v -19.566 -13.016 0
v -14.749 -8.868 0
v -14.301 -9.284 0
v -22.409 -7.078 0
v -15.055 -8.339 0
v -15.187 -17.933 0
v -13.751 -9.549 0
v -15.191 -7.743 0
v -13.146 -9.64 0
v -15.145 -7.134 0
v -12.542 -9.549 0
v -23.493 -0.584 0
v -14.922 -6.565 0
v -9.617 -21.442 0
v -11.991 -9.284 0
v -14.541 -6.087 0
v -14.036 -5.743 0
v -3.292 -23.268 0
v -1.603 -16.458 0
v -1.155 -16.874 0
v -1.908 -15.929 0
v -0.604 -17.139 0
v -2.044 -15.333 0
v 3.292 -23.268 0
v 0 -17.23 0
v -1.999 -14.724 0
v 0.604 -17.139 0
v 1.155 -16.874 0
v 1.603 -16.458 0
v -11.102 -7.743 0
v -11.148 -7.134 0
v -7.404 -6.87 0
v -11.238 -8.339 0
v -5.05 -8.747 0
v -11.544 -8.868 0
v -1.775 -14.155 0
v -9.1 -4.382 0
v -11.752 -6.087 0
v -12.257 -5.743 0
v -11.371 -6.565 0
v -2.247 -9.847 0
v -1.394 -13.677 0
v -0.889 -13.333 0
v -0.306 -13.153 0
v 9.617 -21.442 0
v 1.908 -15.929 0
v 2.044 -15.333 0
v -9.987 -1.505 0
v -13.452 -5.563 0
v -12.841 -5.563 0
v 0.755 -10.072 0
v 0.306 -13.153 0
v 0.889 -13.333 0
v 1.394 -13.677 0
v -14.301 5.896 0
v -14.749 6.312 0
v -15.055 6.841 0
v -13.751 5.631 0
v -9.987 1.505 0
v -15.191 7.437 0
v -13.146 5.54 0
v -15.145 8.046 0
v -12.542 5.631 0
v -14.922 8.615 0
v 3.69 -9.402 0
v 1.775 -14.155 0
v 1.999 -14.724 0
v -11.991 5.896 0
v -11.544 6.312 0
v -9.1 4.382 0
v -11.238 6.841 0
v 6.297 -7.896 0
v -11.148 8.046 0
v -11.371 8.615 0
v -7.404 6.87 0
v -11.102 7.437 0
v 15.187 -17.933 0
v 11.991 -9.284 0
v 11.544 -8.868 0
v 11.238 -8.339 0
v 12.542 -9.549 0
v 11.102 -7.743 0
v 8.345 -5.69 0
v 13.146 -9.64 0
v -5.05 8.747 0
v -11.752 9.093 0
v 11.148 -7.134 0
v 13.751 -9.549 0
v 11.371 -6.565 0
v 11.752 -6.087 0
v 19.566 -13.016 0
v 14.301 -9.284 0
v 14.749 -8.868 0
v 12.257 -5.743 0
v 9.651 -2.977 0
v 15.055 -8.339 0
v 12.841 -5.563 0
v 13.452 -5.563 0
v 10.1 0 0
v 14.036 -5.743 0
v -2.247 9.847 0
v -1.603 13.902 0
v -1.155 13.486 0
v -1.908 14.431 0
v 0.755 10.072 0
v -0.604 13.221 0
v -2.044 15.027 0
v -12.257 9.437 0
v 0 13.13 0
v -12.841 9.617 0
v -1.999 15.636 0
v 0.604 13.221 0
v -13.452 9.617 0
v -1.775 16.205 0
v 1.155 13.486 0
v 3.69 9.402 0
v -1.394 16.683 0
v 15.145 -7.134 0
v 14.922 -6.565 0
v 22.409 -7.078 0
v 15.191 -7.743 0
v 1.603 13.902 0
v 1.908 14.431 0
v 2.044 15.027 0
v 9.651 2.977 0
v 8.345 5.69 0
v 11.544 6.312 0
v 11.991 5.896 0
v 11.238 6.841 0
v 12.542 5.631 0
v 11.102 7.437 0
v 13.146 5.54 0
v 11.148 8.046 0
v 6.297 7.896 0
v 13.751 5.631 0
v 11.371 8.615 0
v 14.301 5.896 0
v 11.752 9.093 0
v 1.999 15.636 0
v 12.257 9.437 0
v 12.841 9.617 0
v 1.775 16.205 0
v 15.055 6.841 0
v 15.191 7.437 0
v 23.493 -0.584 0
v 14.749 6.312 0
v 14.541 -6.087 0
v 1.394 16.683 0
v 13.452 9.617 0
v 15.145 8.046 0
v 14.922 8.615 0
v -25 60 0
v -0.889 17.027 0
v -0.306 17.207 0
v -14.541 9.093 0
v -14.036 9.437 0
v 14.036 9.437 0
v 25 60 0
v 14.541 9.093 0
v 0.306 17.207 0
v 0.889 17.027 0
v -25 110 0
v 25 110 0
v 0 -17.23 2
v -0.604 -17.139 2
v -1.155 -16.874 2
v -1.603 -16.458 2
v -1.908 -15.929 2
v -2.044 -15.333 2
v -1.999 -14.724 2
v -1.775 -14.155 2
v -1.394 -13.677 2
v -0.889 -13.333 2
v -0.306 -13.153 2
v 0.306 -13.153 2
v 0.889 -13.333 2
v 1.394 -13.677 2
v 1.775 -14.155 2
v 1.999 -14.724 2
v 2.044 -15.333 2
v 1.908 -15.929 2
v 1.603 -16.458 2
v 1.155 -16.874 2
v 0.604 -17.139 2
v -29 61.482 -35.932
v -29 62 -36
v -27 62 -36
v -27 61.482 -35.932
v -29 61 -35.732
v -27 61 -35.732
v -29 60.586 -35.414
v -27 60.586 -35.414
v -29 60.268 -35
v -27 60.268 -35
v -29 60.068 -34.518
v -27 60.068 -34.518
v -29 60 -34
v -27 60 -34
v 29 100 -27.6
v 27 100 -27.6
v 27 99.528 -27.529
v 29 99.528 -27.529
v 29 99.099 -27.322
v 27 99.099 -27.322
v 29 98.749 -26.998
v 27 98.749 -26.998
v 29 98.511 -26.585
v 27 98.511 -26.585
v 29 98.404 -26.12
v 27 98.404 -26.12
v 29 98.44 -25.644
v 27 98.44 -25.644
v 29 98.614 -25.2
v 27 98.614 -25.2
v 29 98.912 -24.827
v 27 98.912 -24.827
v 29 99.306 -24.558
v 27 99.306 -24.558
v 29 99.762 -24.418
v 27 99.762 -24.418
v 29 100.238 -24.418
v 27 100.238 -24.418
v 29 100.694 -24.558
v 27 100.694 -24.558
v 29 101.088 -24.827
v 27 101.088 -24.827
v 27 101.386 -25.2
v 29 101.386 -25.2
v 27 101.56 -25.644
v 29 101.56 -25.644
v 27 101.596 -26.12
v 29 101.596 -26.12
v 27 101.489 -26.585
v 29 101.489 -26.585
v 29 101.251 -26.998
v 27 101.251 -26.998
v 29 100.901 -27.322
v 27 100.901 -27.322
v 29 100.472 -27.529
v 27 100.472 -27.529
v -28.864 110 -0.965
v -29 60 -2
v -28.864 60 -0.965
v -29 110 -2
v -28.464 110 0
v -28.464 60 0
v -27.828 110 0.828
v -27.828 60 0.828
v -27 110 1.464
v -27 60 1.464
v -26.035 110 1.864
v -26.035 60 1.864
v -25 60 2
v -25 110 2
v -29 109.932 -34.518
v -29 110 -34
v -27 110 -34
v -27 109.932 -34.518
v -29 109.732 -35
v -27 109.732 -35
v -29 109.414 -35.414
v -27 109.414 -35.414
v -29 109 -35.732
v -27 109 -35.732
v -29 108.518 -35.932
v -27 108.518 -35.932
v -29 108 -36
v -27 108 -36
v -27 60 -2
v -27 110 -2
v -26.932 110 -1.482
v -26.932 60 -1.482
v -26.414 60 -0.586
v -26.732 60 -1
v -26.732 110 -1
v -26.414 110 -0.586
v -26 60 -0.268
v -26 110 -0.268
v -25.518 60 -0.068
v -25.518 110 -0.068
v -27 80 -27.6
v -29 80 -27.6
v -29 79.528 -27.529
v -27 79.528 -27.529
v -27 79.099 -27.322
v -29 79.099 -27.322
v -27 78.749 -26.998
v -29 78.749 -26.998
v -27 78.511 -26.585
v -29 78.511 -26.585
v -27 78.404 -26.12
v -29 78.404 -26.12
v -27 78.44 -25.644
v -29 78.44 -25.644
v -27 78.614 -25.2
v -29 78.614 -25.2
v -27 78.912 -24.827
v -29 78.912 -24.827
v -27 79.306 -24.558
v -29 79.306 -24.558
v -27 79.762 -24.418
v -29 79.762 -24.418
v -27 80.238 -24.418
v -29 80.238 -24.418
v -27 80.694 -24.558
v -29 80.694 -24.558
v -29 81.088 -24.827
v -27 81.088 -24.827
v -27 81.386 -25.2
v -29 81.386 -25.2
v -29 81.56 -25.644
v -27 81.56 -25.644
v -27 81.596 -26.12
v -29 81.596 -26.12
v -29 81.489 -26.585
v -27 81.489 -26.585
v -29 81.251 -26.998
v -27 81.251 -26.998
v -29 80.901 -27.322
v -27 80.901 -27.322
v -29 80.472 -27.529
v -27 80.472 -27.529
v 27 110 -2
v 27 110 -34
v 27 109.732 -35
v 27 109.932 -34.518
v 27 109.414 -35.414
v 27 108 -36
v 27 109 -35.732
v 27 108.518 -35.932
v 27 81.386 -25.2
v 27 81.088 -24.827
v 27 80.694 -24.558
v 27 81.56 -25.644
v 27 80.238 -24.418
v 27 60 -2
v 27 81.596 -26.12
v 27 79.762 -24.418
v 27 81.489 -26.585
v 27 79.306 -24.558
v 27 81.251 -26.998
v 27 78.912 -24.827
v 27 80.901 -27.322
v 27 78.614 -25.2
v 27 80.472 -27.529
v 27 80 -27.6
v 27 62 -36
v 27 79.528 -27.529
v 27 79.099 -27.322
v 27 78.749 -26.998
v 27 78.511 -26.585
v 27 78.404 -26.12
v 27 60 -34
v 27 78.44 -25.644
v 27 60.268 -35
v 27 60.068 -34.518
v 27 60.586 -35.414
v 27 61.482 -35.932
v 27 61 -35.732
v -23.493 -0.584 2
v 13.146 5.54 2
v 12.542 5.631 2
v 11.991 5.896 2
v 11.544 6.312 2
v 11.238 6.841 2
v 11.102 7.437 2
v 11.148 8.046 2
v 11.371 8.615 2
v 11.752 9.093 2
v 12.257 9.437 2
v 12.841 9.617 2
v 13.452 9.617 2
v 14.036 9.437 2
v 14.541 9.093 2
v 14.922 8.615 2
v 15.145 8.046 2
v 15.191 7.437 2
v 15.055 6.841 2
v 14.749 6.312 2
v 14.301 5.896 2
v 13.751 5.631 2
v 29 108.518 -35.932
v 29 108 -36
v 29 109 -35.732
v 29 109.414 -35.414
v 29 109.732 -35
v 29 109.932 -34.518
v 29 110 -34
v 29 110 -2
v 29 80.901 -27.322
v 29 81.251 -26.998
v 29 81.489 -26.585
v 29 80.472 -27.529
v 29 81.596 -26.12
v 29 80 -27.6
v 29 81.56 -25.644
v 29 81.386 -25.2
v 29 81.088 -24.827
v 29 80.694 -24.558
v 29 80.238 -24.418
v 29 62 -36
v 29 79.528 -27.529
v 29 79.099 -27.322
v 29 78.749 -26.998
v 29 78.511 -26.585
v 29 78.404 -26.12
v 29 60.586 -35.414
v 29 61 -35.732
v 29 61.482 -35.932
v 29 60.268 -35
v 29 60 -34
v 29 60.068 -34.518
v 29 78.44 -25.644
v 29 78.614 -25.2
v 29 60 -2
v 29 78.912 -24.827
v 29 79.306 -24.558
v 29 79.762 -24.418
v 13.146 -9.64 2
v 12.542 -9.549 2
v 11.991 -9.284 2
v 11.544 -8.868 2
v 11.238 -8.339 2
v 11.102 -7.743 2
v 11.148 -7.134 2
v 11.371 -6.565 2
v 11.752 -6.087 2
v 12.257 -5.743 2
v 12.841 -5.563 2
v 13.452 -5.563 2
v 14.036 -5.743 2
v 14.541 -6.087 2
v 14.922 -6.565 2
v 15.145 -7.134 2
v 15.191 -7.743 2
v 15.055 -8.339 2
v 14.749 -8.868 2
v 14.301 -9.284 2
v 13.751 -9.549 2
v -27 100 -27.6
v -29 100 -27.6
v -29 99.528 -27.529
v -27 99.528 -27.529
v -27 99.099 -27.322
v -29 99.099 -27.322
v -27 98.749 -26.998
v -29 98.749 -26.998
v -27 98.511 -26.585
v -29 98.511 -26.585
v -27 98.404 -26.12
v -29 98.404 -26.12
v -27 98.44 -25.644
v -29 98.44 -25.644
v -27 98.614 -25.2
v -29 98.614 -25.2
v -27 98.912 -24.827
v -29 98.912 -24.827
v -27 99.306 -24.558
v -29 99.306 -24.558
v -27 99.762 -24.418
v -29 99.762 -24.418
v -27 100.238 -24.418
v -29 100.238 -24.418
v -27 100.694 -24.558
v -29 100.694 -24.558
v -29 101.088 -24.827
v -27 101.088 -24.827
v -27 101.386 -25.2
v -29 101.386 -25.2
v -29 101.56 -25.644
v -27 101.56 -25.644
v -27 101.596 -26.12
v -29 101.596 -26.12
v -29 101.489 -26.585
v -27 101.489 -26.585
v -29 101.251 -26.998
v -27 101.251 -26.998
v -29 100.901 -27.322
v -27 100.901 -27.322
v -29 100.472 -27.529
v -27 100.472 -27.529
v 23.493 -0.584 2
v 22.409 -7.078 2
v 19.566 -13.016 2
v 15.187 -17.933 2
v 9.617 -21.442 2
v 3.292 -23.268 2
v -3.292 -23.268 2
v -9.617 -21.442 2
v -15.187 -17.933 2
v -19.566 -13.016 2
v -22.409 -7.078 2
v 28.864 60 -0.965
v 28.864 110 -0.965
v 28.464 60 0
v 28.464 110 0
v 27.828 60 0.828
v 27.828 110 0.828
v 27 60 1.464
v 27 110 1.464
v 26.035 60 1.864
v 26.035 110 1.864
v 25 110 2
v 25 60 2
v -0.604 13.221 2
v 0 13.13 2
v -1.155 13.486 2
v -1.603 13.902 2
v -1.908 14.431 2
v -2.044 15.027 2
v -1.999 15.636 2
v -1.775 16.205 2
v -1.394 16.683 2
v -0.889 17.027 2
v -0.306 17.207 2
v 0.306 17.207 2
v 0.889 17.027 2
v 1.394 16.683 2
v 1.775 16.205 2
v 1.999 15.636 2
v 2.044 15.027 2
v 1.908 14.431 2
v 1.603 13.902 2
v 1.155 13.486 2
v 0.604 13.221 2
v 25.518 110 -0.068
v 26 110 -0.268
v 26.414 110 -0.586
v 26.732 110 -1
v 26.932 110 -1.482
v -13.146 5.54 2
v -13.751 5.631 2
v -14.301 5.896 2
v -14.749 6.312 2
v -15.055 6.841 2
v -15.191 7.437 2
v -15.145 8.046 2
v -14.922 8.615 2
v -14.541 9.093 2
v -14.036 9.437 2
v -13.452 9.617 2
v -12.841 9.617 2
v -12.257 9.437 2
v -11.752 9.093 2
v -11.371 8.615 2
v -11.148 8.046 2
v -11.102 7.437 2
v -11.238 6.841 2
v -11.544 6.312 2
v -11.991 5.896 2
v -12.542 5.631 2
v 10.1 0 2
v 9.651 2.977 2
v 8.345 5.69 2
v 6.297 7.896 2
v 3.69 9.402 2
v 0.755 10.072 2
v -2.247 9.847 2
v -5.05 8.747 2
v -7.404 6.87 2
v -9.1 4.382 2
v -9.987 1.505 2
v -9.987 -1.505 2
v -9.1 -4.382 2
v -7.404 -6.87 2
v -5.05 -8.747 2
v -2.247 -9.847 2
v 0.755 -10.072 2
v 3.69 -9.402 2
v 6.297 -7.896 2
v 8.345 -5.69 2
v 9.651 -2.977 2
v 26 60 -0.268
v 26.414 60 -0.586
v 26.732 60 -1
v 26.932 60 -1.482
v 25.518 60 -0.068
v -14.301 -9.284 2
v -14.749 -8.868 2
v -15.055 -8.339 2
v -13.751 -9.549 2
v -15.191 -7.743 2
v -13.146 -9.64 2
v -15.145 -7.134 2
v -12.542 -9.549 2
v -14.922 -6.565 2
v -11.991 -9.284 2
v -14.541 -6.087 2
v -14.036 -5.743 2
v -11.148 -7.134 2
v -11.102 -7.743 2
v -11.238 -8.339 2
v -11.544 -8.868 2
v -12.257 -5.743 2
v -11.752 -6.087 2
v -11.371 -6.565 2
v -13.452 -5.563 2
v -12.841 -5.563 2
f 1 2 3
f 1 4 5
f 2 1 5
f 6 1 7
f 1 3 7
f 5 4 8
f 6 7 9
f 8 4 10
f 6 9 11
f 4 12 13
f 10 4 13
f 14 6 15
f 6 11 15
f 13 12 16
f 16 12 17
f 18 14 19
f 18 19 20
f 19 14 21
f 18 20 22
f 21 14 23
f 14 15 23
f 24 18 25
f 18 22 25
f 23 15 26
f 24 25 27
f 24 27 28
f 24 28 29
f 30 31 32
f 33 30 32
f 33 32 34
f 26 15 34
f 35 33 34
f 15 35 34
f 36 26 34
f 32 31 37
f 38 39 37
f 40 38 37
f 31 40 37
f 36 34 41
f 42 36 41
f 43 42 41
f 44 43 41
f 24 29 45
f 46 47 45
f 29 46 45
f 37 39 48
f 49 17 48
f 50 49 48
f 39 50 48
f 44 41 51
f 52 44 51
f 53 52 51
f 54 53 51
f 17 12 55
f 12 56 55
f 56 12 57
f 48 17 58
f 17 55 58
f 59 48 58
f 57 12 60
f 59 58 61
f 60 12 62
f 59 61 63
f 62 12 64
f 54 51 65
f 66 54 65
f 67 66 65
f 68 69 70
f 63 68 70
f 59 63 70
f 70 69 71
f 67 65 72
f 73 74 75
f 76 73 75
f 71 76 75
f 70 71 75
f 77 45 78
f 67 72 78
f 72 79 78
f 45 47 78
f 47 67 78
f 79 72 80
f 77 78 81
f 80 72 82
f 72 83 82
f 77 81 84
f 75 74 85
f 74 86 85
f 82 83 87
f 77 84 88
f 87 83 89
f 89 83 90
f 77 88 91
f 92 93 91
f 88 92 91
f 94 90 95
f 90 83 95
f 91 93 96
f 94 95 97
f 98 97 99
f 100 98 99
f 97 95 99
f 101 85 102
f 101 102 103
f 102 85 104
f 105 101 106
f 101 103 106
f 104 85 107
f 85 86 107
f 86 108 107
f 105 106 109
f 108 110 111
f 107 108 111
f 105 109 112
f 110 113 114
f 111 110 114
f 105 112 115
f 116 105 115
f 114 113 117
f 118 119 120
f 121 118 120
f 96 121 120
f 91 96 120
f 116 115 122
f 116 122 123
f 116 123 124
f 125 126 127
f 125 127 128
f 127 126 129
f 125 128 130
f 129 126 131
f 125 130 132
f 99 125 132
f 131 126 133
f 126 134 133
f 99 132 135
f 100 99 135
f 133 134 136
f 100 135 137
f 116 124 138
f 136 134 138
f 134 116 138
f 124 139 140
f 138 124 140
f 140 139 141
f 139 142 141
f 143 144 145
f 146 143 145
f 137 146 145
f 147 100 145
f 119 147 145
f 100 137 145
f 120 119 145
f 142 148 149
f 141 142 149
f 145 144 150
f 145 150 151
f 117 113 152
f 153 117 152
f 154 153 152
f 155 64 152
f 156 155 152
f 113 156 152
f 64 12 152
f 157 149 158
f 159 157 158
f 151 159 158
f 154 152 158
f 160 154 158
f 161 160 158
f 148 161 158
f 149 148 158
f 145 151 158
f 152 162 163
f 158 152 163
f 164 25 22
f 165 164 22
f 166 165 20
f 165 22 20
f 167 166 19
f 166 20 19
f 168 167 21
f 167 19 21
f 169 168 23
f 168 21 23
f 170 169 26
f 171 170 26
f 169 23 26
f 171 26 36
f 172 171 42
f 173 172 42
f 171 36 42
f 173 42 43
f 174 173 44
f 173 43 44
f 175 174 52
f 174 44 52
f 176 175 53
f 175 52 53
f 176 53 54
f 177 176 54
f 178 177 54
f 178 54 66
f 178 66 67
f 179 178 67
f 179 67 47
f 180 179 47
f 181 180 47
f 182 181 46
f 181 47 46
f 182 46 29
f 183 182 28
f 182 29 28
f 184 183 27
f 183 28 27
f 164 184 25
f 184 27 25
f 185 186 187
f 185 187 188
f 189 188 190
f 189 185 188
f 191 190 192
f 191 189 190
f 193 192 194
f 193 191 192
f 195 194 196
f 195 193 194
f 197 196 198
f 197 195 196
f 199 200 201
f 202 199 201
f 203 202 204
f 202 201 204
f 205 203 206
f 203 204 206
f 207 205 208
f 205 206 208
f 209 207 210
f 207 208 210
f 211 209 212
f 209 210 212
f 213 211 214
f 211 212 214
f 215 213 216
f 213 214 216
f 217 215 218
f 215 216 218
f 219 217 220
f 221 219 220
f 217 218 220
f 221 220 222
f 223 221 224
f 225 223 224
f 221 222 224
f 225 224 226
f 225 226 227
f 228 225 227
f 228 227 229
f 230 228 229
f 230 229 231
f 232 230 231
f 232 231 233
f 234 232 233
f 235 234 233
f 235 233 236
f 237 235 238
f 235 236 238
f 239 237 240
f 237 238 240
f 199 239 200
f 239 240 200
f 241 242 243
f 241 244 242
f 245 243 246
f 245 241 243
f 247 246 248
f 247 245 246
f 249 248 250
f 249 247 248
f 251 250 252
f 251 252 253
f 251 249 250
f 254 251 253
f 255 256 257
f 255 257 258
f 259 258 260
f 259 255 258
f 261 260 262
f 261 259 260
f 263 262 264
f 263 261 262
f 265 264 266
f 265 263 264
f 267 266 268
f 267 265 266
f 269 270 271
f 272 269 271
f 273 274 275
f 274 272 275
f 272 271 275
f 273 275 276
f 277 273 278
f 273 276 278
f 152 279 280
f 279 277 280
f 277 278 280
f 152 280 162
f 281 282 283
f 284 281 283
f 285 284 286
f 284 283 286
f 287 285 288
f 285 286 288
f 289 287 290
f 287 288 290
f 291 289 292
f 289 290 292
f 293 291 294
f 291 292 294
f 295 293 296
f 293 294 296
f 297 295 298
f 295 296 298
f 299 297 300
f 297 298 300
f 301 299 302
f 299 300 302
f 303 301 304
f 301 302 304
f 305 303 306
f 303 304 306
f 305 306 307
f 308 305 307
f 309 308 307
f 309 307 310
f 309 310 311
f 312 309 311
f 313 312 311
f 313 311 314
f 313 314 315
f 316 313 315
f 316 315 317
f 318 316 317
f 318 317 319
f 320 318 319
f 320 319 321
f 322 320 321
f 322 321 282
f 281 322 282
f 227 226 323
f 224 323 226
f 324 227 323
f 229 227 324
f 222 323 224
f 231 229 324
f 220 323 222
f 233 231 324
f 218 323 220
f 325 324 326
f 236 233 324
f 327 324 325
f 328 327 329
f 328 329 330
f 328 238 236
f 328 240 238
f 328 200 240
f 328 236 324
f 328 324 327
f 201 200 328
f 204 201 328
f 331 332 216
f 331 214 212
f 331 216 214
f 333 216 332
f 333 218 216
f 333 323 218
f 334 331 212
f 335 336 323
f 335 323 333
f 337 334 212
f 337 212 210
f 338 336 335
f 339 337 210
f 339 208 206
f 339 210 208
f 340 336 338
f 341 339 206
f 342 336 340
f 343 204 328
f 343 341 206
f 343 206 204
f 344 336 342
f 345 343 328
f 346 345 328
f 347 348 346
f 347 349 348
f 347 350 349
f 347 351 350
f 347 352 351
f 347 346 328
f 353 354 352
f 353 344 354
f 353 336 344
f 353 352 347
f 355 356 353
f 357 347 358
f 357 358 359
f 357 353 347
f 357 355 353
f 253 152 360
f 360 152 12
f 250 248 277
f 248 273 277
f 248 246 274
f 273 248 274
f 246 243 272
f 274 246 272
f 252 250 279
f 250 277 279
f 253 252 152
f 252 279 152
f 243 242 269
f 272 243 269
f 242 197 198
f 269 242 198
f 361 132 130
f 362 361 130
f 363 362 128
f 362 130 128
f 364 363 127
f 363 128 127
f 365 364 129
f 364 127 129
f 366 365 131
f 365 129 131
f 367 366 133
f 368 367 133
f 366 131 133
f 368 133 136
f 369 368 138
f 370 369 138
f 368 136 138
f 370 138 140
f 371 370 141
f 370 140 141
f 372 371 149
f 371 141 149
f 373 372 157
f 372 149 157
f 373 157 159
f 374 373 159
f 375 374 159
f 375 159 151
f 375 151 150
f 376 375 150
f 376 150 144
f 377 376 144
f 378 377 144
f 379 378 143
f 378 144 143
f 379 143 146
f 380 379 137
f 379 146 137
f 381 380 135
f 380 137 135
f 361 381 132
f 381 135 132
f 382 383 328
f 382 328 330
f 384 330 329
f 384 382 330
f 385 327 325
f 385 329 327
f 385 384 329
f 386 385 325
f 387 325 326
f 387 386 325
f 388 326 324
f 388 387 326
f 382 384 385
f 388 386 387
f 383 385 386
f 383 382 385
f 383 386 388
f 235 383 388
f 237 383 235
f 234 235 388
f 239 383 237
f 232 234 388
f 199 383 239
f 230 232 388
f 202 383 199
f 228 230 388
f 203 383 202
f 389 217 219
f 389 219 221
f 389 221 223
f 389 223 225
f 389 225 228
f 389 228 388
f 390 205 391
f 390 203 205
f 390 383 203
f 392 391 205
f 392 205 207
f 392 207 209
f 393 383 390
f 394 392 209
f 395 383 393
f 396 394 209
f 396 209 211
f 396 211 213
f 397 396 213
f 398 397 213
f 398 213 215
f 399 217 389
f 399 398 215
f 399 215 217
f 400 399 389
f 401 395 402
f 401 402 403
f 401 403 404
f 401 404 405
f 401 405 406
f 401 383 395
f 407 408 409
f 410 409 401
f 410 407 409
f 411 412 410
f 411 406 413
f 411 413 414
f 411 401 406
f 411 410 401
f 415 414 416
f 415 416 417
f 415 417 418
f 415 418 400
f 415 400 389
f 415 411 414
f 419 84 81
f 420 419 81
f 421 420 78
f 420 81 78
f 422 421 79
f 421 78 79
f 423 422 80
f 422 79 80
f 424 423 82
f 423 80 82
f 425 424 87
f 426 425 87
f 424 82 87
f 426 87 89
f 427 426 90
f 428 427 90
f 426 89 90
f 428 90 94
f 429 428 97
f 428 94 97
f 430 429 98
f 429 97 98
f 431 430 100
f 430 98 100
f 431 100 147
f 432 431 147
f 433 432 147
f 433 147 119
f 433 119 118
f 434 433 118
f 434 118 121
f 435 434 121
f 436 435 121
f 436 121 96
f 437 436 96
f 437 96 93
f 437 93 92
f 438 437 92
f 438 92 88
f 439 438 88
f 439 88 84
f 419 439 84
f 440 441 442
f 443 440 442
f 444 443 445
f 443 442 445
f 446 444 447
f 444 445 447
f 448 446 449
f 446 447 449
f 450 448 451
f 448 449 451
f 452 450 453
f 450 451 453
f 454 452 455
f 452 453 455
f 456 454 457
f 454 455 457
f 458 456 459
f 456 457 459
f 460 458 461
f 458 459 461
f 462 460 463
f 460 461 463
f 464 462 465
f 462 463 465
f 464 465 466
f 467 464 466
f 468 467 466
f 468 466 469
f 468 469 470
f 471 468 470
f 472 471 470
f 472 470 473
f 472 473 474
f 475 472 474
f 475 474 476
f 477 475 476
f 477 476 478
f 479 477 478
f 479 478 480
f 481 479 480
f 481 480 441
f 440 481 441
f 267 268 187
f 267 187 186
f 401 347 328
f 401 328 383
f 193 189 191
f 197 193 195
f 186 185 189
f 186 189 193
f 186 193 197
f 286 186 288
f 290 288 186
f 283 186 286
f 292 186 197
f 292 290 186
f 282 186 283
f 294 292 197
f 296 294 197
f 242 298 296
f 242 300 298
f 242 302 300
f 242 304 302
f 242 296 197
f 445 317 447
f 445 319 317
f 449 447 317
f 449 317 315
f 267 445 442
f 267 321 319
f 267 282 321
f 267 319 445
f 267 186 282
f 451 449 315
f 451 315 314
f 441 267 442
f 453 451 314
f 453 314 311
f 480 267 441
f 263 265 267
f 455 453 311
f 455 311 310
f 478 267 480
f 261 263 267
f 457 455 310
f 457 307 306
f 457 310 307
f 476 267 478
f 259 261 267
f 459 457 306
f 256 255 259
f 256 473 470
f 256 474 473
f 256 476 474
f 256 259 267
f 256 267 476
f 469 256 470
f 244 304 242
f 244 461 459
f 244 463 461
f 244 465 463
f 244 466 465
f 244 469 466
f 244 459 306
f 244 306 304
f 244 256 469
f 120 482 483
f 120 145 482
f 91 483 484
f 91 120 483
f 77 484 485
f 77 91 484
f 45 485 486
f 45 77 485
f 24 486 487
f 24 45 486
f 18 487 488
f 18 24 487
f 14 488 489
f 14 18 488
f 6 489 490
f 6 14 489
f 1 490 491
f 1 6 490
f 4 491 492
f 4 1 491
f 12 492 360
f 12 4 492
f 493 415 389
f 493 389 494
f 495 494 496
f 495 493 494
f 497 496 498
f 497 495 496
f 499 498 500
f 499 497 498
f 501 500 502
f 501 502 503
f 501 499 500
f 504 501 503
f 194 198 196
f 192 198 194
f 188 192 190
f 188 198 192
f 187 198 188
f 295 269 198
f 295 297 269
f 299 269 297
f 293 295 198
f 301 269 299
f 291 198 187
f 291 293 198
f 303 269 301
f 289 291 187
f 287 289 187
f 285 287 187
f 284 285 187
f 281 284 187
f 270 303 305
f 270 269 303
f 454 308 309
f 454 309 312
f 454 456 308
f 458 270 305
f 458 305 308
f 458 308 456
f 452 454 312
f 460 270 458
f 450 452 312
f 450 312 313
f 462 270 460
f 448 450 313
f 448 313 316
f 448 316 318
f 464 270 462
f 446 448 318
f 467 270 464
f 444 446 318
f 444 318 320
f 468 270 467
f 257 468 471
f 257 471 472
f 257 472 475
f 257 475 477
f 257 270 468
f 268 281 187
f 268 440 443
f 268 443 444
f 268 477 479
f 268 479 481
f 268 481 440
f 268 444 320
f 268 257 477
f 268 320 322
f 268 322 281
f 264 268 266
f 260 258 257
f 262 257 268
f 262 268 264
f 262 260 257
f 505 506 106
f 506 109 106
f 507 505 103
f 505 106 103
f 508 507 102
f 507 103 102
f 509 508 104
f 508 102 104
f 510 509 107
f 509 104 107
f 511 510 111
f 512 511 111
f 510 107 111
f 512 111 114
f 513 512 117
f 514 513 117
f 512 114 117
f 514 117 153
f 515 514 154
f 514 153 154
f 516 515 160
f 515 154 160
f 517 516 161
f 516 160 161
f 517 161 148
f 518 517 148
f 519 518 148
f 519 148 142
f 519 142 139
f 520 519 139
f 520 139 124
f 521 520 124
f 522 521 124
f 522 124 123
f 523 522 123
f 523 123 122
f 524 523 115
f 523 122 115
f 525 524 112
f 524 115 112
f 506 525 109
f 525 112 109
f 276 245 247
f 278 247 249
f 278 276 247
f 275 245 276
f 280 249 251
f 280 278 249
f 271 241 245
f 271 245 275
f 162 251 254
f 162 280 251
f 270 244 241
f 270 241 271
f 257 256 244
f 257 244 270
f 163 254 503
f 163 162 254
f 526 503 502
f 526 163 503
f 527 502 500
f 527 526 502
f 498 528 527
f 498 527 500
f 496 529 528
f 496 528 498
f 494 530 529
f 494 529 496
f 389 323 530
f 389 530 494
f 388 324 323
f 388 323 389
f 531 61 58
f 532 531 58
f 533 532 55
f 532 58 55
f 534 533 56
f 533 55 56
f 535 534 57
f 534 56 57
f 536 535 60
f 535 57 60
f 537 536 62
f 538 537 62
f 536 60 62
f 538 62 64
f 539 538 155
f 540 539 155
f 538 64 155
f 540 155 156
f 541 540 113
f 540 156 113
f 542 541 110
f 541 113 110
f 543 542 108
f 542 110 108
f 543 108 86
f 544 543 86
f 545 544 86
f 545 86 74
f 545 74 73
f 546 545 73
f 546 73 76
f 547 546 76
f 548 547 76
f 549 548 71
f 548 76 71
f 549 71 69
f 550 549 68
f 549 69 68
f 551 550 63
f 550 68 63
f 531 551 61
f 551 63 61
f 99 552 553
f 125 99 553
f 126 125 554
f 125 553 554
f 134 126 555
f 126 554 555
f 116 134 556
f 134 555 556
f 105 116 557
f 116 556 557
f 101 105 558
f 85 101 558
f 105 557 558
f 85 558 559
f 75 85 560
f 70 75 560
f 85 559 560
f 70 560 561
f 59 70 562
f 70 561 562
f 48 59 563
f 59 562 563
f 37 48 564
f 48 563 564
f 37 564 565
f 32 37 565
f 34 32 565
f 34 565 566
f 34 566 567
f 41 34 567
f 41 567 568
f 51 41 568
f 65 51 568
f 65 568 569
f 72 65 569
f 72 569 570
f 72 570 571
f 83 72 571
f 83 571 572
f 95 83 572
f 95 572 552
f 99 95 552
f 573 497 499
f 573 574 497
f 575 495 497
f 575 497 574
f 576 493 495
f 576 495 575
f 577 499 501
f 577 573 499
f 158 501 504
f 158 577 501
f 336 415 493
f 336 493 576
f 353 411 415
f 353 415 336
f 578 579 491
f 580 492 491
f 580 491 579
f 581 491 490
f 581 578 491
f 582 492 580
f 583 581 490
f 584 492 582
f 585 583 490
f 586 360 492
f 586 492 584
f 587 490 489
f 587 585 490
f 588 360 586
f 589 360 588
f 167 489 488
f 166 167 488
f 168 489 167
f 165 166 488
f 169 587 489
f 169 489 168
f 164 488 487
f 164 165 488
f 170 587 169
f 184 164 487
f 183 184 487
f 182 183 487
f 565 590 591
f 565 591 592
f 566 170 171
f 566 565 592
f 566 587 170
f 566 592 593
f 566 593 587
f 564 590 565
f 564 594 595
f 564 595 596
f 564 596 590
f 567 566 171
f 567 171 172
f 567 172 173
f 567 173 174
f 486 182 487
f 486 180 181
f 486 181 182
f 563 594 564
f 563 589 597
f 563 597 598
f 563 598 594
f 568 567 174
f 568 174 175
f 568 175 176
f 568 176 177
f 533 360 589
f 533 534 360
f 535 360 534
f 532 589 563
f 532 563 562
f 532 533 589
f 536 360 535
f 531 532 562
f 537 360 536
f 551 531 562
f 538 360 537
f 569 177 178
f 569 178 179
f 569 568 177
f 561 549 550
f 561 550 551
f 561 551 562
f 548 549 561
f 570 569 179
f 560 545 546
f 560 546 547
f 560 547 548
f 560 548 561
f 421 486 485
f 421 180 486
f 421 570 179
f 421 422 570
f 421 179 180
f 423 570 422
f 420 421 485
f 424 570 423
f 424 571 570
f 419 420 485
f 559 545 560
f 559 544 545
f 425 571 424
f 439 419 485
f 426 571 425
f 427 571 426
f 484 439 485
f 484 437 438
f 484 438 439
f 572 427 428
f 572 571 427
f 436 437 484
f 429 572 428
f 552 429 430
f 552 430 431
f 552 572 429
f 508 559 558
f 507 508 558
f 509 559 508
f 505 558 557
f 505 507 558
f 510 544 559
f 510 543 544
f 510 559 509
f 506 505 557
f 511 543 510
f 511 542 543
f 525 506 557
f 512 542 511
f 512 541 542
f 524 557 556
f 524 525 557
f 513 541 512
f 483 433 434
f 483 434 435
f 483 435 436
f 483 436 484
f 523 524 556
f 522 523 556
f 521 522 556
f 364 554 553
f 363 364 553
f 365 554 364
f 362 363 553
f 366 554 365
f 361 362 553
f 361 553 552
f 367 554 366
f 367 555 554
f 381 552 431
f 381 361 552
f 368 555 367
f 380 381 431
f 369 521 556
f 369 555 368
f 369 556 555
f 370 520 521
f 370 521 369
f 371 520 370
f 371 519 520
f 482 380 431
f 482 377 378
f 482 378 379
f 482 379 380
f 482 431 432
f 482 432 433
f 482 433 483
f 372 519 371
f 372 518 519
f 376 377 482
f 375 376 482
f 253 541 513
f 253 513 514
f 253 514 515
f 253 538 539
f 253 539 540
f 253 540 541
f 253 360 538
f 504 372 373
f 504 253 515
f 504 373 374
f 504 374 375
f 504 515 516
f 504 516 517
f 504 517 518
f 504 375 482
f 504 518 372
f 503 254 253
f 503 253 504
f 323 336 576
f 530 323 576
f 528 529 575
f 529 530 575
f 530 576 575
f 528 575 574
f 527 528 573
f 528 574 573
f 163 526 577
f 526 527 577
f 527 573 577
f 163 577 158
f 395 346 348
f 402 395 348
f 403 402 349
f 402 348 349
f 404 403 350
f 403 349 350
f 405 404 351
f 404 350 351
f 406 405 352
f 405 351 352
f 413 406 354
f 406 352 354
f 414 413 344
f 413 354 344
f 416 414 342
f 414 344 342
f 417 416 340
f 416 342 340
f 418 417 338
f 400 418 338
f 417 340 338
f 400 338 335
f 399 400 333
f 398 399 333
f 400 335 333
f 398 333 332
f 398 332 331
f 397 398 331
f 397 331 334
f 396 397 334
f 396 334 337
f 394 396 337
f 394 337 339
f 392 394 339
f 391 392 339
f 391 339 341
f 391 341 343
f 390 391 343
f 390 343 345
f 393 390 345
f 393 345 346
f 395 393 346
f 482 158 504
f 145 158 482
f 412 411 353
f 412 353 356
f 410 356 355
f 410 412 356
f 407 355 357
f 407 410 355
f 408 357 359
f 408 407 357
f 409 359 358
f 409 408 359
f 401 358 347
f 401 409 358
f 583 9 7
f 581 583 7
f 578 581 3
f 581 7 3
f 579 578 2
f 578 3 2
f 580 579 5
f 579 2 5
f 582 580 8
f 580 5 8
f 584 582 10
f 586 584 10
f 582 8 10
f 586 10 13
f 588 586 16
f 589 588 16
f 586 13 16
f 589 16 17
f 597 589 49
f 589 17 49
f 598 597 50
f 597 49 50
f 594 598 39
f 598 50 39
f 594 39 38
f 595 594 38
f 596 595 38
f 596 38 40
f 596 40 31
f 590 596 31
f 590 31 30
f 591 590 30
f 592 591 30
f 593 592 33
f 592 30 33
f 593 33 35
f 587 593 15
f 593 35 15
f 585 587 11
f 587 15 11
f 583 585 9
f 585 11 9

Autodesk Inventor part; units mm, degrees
ref_plane "YZ Plane" through (0, 0, 0) normal (1, 0, 0) x (0, 1, 0)
ref_plane "XZ Plane" through (0, 0, 0) normal (0, 1, 0) x (-1, 0, 0)
ref_plane "XY Plane" through (0, 0, 0) normal (0, 0, 1) x (1, 0, 0)
sketch "スケッチ1" plane through (0, 0, 0) normal (0, 0, 1) x (1, 0, 0)
  circle A0 centre (0, 0) radius 23.5
  line L0 (0, 0) -> (0, 60)
  line L1 (0, 60) -> (25, 60)
  line L2 (25, 60) -> (25, 110)
  line L3 (25, 110) -> (0, 110)
  line L4 (0, 110) -> (0, 60)
  line L5 (25, 60) -> (23.4927, -0.5845)
  line L6 (0, 60) -> (-25, 60)
  line L7 (-25, 60) -> (-25, 110)
  line L8 (-25, 110) -> (0, 110)
  line L9 (-25, 60) -> (-23.4927, -0.5845)
  point P0 (-23.4927, -0.5845)
  dimension "d0" = 47
  dimension "d1" = 60
  dimension "d2" = 50
  dimension "d3" = 25
extrude "プレート1" add sketch "スケッチ1" along normal blind 2
sketch "スケッチ2" plane through (27, 60, -2) normal (1, 0, 0) x (0, 1, 0)
  line L0 (50, 0) -> (0, 0)
  line L1 (0, 0) -> (0, -34)
  line L2 (0, -34) -> (50, -34)
  line L3 (50, -34) -> (50, 0)
edge flange "フランジ1" height 38 angle 90 thickness 2 bend radius 2 thickness toward (1, 0, 0) relief tear relief width 2 relief depth 1 edges at (25, 85, 0) wall of the first edge with corners at (27, 110, -2) (27, 60, -2) (27, 60, -36) (27, 110, -36)
bend "曲げ1"
corner "コーナー1"
sketch "スケッチ3" plane through (-27, 110, -2) normal (-1, 0, 0) x (0, -1, 0)
  line L0 (50, 0) -> (0, 0)
  line L1 (0, 0) -> (0, -34)
  line L2 (0, -34) -> (50, -34)
  line L3 (50, -34) -> (50, 0)
edge flange "フランジ2" height 38 angle 90 thickness 2 bend radius 2 thickness toward (-1, 0, 0) relief tear relief width 2 relief depth 1 edges at (-25, 85, 0) wall of the first edge with corners at (-27, 60, -2) (-27, 110, -2) (-27, 110, -36) (-27, 60, -36)
bend "曲げ2"
corner "コーナー2"
sketch "スケッチ4" plane through (0, 0, 2) normal (0, 0, 1) x (1, 0, 0)
  circle A0 centre (0, 0) radius 10.1
  dimension "d25" = 20.2
extrude "押し出し1" cut sketch "スケッチ4" against normal blind 10
sketch "スケッチ5" plane through (0, 0, 2) normal (0, 0, 1) x (1, 0, 0)
  circle A0 centre (0, 0) radius 15.18
  point P0 (0, 15.18)
  point P1 (-13.1463, 7.59)
  point P2 (-13.1463, -7.59)
  point P3 (0, -15.18)
  point P4 (13.1463, -7.59)
  point P5 (13.1463, 7.59)
  dimension "d28" = 30.36
  dimension "d31" = 360
hole "穴1" at (0, 15.18, 2) at (-13.1463, 7.59, 2) at (-13.1463, -7.59, 2) at (0, -15.18, 2) at (13.1463, -7.59, 2) at (13.1463, 7.59, 2) direction (0, 0, -1) diameter 4.1 end through all
sketch "スケッチ6" plane through (29, 60, -36) normal (1, 0, 0) x (0, 0, -1)
  line L0 (0, 0) -> (0, 50) projected
  line L1 (0, 10) -> (-34, 10)
  line L2 (-34, 50) -> (-34, 0) projected
  line L3 (0, 0) -> (-34, 0) projected
  line L4 (0, 50) -> (-34, 50) projected
  line L5 (-10, 50) -> (-10, 10)
  point P0 (-36, -60)
  point P1 (-10, 20)
  point P2 (-10, 40)
  point P3 (-36, 50)
  dimension "d40" = 10
  dimension "d42" = 10
  dimension "d43" = 20
  dimension "d62" = 26
hole "穴2" at (29, 80, -26) at (29, 100, -26) direction (-1, 0, 0) diameter 3.2 end through all
sketch "スケッチ7" plane through (0, 0, 2) normal (0, 0, 1) x (1, 0, 0)
  line L0 (-15, 100) -> (15, 100)
  line L1 (15, 100) -> (15, 60)
  line L2 (15, 60) -> (-15, 60)
  line L3 (-15, 60) -> (-15, 100)
  line L4 (-25, 110) -> (25, 110) projected
  line L5 (-25, 60) -> (-25, 110) projected
  line L6 (25, 110) -> (25, 60) projected
  circle A0 centre (0, 0) radius 10.1 projected
  circle A1 centre (0, 0) radius 13.5
  line L7 (-13.4958, -0.3358) -> (-14.7481, 50)
  line L8 (-23.4927, -0.5845) -> (-25, 60) projected
  line L9 (13.4958, -0.3358) -> (14.7481, 50)
  line L10 (25, 60) -> (23.4927, -0.5845) projected
  line L11 (-14.7481, 50) -> (14.7481, 50)
  line L12 (-14.0018, 20) -> (14.0018, 20)
  dimension "d51" = 10
  dimension "d52" = 10
  dimension "d53" = 10
  dimension "d54" = 40
  dimension "d55" = 10
  dimension "d56" = 10
  dimension "d57" = 20
extrude "押し出し2" [suppressed]
fillet "フィレット1" [suppressed]
fillet "フィレット2" radius 2 4 edges at (-28, 60, -36) (-28, 110, -36) (28, 60, -36) (28, 110, -36)
equation "\"d38\" = Thickness"
equation "\"d4\" = Thickness"
equation "\"d5\" = BendReliefWidth"
equation "\"d6\" = BendReliefDepth"
equation "\"d7\" = MinimumRemnant"
equation "\"d8\" = TransitionRadius"
equation "\"d11\" = BendRadius"
equation "\"d12\" = CornerReliefSize"
equation "\"d13\" = GapSize"
equation "\"d14\" = JacobiRadiusSize"
equation "\"d15\" = BendReliefWidth"
equation "\"d16\" = BendReliefDepth"
equation "\"d17\" = MinimumRemnant"
equation "\"d18\" = TransitionRadius"
equation "\"d21\" = BendRadius"
equation "\"d22\" = CornerReliefSize"
equation "\"d23\" = GapSize"
equation "\"d24\" = JacobiRadiusSize"
equation "\"BendRadius\" = Thickness"
equation "\"BendReliefWidth\" = Thickness"
equation "\"BendReliefDepth\" = 0.5 * Thickness"
equation "\"CornerReliefSize\" = 4 * Thickness"
equation "\"MinimumRemnant\" = 2 * Thickness"
equation "\"TransitionRadius\" = BendRadius"
equation "\"JacobiRadiusSize\" = BendRadius"
equation "\"GapSize\" = Thickness"
equation "\"Thickness\" = 2"
properties part number "servoplate1_forR3" material "アルミニウム 6061"
